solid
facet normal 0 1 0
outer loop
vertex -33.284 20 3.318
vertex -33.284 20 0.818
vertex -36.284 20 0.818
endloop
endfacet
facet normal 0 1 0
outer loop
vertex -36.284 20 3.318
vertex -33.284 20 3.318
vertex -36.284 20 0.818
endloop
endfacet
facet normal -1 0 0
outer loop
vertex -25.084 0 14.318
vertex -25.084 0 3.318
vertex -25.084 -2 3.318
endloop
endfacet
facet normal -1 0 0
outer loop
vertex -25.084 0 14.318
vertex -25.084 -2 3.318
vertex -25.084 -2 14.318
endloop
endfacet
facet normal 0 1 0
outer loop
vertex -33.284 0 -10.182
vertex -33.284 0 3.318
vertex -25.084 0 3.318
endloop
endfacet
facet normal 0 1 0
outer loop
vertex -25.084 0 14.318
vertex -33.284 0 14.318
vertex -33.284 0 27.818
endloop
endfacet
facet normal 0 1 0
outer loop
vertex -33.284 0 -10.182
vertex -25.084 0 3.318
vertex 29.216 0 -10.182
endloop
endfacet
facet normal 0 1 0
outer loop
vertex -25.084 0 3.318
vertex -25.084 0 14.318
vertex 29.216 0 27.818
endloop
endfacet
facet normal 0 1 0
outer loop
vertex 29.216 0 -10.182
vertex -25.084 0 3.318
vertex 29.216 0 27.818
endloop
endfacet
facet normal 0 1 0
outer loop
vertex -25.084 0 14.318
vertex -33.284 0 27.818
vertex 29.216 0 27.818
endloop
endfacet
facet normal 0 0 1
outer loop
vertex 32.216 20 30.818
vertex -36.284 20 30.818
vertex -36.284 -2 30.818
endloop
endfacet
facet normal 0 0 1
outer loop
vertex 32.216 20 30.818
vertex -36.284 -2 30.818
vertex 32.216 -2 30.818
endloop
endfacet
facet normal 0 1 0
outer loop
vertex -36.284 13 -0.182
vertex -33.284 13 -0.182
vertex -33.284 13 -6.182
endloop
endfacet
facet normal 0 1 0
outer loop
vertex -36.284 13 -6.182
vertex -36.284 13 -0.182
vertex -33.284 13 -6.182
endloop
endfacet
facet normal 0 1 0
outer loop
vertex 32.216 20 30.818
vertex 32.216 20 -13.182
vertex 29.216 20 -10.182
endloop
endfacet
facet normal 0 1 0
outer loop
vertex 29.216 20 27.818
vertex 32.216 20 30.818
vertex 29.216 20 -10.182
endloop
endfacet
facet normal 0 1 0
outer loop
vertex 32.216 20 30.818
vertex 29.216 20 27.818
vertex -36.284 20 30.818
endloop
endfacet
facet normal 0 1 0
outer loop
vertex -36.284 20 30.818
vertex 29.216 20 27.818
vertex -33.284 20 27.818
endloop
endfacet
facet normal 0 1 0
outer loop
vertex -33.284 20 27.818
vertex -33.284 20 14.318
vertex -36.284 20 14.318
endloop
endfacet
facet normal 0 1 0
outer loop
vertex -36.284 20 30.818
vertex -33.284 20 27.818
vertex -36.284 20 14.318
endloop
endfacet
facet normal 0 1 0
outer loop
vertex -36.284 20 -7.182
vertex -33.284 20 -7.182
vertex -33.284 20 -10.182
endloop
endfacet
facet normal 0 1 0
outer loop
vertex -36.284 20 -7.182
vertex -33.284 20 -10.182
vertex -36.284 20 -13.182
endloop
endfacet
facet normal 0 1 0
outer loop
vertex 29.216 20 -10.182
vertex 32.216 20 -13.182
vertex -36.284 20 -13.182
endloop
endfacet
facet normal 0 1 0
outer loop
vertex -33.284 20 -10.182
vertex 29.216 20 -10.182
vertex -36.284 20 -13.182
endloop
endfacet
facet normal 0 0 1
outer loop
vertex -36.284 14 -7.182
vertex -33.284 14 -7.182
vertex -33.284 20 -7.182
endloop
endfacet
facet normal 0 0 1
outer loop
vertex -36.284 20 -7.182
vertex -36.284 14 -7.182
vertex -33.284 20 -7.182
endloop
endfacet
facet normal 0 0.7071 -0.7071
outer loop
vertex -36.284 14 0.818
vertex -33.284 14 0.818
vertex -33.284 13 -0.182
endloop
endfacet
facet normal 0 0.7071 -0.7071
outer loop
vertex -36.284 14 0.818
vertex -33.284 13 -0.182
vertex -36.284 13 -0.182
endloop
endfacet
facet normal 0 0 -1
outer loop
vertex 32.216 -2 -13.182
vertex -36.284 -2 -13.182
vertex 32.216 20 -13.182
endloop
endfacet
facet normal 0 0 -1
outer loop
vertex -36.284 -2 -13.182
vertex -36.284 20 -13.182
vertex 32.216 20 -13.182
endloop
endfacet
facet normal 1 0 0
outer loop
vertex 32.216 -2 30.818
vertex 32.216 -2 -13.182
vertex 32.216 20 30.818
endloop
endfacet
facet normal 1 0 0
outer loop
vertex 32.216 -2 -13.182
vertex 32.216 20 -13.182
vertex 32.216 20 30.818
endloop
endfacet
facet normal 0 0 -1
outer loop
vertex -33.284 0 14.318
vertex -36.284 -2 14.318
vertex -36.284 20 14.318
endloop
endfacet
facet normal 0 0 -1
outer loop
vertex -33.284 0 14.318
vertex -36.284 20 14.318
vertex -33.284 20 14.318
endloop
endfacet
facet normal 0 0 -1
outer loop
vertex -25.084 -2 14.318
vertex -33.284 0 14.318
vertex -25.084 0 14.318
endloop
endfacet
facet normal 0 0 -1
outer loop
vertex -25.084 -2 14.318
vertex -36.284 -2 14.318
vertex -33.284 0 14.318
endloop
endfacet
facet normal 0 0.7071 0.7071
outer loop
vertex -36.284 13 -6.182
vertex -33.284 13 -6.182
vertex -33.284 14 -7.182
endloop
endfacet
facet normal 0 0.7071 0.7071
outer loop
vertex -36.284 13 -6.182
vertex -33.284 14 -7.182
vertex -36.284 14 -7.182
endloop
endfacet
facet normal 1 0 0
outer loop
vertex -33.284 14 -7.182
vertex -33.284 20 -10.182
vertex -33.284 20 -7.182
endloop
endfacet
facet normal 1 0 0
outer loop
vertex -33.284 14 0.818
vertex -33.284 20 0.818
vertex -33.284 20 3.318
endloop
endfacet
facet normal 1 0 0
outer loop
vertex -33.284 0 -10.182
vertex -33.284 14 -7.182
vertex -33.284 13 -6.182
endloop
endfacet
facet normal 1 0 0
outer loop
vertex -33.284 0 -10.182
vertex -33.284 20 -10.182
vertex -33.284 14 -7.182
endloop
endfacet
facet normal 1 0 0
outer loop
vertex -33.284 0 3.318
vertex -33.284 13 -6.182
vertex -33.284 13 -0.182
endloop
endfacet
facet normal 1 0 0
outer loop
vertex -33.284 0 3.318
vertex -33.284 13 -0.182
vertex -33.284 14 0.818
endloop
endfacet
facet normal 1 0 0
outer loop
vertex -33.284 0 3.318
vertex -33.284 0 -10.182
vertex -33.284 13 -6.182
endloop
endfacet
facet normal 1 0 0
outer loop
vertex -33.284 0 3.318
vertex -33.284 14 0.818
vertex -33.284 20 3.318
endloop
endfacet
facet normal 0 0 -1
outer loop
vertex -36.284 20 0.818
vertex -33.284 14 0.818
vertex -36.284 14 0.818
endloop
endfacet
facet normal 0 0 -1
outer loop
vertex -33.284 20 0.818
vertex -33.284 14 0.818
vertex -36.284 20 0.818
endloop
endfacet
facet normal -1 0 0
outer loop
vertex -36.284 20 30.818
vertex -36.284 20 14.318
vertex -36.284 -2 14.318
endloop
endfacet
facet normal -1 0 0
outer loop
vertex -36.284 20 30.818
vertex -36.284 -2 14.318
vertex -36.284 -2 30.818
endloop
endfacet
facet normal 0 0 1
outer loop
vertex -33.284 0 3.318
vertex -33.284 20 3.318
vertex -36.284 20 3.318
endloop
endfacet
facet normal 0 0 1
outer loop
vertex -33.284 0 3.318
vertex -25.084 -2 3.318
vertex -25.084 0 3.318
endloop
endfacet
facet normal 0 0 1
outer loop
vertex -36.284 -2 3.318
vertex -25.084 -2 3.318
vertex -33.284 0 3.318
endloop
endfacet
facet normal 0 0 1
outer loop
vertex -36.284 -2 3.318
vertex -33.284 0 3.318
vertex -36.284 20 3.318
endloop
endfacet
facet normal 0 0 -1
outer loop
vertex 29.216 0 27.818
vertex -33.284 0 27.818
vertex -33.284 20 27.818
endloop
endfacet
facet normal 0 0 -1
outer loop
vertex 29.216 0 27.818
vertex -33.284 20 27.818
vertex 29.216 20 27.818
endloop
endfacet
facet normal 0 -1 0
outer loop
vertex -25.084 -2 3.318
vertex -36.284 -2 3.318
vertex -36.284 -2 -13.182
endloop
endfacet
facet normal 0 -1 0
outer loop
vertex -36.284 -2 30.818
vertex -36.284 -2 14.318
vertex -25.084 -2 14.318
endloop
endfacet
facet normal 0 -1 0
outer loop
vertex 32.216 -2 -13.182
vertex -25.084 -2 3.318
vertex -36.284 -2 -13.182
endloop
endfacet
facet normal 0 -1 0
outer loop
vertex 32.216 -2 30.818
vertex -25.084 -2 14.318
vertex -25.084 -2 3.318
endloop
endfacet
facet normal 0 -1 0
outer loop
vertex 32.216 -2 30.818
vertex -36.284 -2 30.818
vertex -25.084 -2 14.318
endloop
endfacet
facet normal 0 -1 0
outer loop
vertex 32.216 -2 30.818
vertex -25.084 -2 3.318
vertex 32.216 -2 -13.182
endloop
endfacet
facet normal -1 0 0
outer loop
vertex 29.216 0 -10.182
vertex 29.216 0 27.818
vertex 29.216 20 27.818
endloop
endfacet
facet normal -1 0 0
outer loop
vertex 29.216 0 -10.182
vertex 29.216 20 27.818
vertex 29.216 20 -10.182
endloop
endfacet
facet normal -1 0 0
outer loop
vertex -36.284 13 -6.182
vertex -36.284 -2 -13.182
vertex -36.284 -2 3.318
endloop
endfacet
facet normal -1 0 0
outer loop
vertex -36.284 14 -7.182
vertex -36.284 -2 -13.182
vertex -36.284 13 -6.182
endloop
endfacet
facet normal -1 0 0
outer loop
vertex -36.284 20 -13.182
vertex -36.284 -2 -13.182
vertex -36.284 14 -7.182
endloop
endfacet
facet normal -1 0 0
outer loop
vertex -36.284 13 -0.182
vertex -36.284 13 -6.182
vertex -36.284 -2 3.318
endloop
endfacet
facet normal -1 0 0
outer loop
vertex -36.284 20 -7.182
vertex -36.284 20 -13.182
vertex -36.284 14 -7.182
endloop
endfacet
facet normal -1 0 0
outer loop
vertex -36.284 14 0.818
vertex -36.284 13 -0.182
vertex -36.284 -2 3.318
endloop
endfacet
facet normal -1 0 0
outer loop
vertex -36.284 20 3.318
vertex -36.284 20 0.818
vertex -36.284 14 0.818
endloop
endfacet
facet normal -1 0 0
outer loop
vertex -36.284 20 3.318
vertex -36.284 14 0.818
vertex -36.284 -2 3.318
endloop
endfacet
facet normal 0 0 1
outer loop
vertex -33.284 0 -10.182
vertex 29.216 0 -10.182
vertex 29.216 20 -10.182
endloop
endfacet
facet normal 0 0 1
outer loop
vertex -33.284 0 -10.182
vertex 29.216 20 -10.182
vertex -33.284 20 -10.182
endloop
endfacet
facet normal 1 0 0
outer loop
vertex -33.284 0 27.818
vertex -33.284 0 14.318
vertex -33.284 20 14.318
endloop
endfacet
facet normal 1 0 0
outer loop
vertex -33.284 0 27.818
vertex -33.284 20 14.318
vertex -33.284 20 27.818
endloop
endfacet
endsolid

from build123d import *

# Parameters (mm, degrees)
BOSS_EXTRUDE1_DEPTH = 20
SKETCH2_W           = 68.5
SKETCH2_H           = 44
BOSS_EXTRUDE2_DEPTH = 2
SKETCH3_W           = 11
SKETCH3_H           = 2
CUT_EXTRUDE1_DEPTH  = 11.2
SKETCH4_W           = 8
SKETCH4_H           = 7
CUT_EXTRUDE2_DEPTH  = 10
CHAMFER2_SIZE       = 1


with BuildPart() as part:
    # Sketch1 → Boss-Extrude1 (new body)
    with BuildSketch(Plane(origin=(0, 0, 0), x_dir=(1, 0, 0), z_dir=(0, 1, 0))):
        Polygon((-33.284090909, -14.318181818), (-33.284090909, -27.818181818), (29.215909091, -27.818181818), (29.215909091, 10.181818182), (-33.284090909, 10.181818182), (-33.284090909, -3.318181818), (-36.284090909, -3.318181818), (-36.284090909, 13.181818182), (32.215909091, 13.181818182), (32.215909091, -30.818181818), (-36.284090909, -30.818181818), (-36.284090909, -14.318181818), align=None)
    extrude(amount=BOSS_EXTRUDE1_DEPTH)

    # Sketch2 → Boss-Extrude2 (add)
    with BuildSketch(Plane.XZ):
        with Locations((-2.034090909, 8.818181818)):
            Rectangle(SKETCH2_W, SKETCH2_H)
    extrude(amount=BOSS_EXTRUDE2_DEPTH)

    # Sketch3 → Cut-Extrude1 (cut)
    with BuildSketch(Plane.ZY.offset(36.284090909)):
        with Locations((8.818181818, -1)):
            Rectangle(SKETCH3_W, SKETCH3_H)
    extrude(amount=-CUT_EXTRUDE1_DEPTH, mode=Mode.SUBTRACT)

    # Sketch4 → Cut-Extrude2 (cut)
    with BuildSketch(Plane(origin=(-33.284090909, 0, 0), x_dir=(0, 0, -1), z_dir=(1, 0, 0))):
        with Locations((3.181818182, 16.5)):
            Rectangle(SKETCH4_W, SKETCH4_H)
    extrude(amount=-CUT_EXTRUDE2_DEPTH, mode=Mode.SUBTRACT)

    # Chamfer2
    chamfer2_edges = [part.edges().sort_by_distance(p)[0] for p in [
        (-34.784090909, 13, -7.181818182),
        (-34.784090909, 13, 0.818181818),
    ]]
    chamfer(chamfer2_edges, length=CHAMFER2_SIZE)


solid = part.part
